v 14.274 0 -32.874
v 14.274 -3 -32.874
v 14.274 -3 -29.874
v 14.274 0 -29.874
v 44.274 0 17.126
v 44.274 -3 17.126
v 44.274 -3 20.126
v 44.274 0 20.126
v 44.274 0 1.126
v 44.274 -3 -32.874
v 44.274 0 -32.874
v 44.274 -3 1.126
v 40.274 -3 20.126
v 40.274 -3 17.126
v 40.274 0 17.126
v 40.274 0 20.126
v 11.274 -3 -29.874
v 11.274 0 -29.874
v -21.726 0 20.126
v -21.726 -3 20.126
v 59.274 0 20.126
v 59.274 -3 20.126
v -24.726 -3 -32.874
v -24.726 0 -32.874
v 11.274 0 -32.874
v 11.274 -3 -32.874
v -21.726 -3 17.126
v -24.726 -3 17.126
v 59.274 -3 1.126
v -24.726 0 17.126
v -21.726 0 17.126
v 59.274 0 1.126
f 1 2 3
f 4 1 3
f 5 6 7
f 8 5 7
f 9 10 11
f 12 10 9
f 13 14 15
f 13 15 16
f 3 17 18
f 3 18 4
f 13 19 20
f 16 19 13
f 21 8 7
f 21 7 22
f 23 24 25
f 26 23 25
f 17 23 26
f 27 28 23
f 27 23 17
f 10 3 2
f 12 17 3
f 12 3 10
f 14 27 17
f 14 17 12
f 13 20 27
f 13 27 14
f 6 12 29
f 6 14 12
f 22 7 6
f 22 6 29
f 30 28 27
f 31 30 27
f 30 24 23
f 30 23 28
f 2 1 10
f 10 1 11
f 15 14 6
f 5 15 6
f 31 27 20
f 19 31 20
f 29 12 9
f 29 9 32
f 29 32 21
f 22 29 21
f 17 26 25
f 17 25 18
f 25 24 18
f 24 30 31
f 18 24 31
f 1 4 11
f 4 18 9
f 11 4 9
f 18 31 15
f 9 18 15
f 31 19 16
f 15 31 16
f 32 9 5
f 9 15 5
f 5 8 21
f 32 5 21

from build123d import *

# Parameters (mm, degrees)
F0_W     = 84
F0_H     = 53
F1_DEPTH = 3
F2_W     = 15
F2_H     = 34
F3_DEPTH = 25
F4_W     = 4
F4_H     = 3
F5_DEPTH = 25
F6_W     = 3
F6_H     = 3
F7_DEPTH = 25
F8_W     = 3
F8_H     = 3
F9_DEPTH = 25


with BuildPart() as f1:
    # F0 (on Front) → F1 (new body)
    with BuildSketch(Plane.XZ):
        with Locations((17.273909, -6.373649)):
            Rectangle(F0_W, F0_H)
    extrude(amount=F1_DEPTH)

    # F2 (on face) → F3 (cut)
    with BuildSketch(Plane.XZ.offset(3)):
        with Locations((51.773909, -15.873649)):
            Rectangle(F2_W, F2_H)
    extrude(amount=-F3_DEPTH, mode=Mode.SUBTRACT)

    # F4 (on face) → F5 (cut)
    with BuildSketch(Plane.XZ.offset(3)):
        with Locations((42.273909, 18.626351)):
            Rectangle(F4_W, F4_H)
    extrude(amount=-F5_DEPTH, mode=Mode.SUBTRACT)

    # F6 (on face) → F7 (cut)
    with BuildSketch(Plane.XZ.offset(3)):
        with Locations((-23.226091, 18.626351)):
            Rectangle(F6_W, F6_H)
    extrude(amount=-F7_DEPTH, mode=Mode.SUBTRACT)

    # F8 (on face) → F9 (cut)
    with BuildSketch(Plane.XZ.offset(3)):
        with Locations((12.773909, -31.373649)):
            Rectangle(F8_W, F8_H)
    extrude(amount=-F9_DEPTH, mode=Mode.SUBTRACT)


solid = f1.part
